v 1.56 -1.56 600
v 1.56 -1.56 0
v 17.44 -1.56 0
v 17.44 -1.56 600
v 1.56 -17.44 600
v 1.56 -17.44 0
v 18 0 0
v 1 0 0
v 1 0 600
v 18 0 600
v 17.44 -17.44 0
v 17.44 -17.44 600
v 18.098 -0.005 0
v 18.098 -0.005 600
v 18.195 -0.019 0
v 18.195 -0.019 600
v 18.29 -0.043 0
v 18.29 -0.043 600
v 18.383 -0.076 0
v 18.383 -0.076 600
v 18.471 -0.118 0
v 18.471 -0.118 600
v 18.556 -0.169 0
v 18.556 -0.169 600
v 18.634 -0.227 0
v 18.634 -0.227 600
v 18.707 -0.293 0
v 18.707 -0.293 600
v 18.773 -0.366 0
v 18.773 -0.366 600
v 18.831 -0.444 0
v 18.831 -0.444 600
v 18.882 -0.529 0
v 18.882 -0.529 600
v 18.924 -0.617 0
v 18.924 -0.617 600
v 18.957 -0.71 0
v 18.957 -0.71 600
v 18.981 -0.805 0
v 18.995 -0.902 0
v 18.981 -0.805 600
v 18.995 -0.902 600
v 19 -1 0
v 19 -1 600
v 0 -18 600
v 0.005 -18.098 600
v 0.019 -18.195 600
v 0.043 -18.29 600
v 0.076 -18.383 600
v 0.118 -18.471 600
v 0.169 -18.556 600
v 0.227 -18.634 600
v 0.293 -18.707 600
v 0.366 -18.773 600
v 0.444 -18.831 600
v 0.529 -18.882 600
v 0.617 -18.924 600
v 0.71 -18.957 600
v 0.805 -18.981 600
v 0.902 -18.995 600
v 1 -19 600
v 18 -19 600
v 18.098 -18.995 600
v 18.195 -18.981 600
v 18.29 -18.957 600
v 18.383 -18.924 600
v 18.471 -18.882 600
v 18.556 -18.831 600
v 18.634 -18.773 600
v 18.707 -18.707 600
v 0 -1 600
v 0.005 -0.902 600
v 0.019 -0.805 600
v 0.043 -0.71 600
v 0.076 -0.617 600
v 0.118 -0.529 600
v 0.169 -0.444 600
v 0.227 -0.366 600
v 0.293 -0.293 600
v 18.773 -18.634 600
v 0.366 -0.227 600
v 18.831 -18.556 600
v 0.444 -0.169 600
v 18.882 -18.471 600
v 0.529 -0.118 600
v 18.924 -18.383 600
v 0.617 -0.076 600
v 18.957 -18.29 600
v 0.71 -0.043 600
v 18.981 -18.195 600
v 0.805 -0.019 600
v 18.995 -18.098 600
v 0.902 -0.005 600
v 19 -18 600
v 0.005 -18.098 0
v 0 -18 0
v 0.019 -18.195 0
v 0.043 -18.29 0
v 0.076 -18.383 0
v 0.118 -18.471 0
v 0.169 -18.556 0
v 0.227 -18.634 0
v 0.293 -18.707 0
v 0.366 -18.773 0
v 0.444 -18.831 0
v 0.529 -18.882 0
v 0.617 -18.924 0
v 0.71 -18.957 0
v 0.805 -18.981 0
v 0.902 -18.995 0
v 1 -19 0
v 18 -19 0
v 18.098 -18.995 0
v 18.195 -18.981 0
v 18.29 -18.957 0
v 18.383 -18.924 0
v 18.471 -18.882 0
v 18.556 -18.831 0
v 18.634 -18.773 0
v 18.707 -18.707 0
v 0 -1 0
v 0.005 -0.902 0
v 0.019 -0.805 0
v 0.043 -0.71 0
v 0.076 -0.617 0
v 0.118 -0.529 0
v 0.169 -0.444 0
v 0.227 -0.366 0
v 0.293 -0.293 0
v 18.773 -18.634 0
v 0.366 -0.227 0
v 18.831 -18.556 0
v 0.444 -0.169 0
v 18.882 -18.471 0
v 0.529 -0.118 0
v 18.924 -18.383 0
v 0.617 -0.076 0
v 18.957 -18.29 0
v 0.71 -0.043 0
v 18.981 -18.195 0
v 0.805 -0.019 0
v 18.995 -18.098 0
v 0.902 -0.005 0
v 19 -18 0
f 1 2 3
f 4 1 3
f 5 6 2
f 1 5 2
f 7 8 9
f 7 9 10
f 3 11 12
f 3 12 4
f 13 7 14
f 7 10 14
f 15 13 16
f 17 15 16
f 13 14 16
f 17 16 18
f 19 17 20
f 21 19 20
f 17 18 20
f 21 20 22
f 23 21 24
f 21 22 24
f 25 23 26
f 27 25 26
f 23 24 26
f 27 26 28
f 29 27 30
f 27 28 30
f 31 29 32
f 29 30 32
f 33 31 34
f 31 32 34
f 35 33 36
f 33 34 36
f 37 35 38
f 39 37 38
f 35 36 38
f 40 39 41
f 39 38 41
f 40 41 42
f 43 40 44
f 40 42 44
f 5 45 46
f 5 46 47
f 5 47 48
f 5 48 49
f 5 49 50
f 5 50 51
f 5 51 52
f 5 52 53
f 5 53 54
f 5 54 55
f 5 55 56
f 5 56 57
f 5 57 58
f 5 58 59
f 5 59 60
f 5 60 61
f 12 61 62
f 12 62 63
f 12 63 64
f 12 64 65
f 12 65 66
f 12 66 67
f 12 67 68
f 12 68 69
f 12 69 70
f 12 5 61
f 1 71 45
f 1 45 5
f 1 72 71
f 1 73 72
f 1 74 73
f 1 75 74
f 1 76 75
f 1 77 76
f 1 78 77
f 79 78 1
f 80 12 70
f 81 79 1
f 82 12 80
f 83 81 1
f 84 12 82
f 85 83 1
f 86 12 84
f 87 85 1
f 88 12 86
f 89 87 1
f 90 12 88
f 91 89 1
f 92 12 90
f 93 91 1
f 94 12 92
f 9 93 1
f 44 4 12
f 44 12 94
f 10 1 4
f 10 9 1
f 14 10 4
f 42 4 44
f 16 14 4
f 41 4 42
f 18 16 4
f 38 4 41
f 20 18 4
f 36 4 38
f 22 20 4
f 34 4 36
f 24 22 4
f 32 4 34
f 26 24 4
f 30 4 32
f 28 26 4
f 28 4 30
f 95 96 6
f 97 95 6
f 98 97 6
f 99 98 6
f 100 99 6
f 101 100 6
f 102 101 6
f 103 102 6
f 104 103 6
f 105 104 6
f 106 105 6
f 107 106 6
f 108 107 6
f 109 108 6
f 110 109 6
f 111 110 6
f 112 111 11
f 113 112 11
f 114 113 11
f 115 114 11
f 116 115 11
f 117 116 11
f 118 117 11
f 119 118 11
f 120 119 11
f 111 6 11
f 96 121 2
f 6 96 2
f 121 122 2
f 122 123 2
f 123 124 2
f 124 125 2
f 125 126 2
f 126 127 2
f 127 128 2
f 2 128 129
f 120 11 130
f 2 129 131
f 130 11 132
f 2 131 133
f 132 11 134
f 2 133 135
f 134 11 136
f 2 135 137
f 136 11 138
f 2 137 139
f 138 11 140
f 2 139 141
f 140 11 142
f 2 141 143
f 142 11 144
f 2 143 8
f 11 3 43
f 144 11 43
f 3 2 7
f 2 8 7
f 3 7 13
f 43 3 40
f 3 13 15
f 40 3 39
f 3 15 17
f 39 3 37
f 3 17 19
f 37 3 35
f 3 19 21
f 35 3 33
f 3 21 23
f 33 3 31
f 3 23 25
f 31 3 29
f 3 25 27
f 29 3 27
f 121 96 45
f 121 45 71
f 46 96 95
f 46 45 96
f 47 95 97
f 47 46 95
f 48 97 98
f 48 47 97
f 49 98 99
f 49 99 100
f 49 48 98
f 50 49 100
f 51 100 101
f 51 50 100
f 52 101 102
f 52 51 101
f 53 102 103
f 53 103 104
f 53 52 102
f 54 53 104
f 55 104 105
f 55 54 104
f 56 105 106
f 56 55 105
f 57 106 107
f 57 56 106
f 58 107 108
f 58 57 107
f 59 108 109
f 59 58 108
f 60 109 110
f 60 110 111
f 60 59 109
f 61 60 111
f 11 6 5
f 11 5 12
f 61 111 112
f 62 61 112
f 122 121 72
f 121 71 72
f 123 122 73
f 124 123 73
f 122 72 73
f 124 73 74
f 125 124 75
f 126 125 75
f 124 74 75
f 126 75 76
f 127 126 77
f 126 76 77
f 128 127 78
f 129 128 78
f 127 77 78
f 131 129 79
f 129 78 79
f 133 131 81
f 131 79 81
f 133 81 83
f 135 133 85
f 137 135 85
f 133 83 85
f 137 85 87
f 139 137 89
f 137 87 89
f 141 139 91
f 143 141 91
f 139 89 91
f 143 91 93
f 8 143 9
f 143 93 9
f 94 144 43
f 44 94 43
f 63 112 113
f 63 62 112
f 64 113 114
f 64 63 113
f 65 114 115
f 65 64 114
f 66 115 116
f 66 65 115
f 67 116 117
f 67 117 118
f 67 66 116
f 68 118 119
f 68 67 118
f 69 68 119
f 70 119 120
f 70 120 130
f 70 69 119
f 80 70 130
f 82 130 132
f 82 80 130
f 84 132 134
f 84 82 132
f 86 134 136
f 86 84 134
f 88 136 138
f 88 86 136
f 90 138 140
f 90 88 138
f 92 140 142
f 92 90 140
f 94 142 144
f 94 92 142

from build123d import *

# Parameters (mm, degrees)
SKETCH_1_W      = 19
SKETCH_1_H      = 19
SKETCH_1_W_2    = 15.88
SKETCH_1_H_2    = 15.88
EXTRUDE_1_DEPTH = 600
FILLET_2_R      = 1


with BuildPart() as part:
    # 스케치1 → 보스-돌출1 (new body)
    with BuildSketch(Plane.XY):
        with Locations((9.5, -9.5)):
            Rectangle(SKETCH_1_W, SKETCH_1_H)
        with Locations((9.5, -9.5)):
            Rectangle(SKETCH_1_W_2, SKETCH_1_H_2, mode=Mode.SUBTRACT)
    extrude(amount=EXTRUDE_1_DEPTH)

    # 필렛2
    fillet_2_edges = [part.edges().sort_by_distance(p)[0] for p in [
        (0, 0, 300),
        (19, 0, 300),
        (19, -19, 300),
        (0, -19, 300),
    ]]
    fillet(fillet_2_edges, radius=FILLET_2_R)


solid = part.part
